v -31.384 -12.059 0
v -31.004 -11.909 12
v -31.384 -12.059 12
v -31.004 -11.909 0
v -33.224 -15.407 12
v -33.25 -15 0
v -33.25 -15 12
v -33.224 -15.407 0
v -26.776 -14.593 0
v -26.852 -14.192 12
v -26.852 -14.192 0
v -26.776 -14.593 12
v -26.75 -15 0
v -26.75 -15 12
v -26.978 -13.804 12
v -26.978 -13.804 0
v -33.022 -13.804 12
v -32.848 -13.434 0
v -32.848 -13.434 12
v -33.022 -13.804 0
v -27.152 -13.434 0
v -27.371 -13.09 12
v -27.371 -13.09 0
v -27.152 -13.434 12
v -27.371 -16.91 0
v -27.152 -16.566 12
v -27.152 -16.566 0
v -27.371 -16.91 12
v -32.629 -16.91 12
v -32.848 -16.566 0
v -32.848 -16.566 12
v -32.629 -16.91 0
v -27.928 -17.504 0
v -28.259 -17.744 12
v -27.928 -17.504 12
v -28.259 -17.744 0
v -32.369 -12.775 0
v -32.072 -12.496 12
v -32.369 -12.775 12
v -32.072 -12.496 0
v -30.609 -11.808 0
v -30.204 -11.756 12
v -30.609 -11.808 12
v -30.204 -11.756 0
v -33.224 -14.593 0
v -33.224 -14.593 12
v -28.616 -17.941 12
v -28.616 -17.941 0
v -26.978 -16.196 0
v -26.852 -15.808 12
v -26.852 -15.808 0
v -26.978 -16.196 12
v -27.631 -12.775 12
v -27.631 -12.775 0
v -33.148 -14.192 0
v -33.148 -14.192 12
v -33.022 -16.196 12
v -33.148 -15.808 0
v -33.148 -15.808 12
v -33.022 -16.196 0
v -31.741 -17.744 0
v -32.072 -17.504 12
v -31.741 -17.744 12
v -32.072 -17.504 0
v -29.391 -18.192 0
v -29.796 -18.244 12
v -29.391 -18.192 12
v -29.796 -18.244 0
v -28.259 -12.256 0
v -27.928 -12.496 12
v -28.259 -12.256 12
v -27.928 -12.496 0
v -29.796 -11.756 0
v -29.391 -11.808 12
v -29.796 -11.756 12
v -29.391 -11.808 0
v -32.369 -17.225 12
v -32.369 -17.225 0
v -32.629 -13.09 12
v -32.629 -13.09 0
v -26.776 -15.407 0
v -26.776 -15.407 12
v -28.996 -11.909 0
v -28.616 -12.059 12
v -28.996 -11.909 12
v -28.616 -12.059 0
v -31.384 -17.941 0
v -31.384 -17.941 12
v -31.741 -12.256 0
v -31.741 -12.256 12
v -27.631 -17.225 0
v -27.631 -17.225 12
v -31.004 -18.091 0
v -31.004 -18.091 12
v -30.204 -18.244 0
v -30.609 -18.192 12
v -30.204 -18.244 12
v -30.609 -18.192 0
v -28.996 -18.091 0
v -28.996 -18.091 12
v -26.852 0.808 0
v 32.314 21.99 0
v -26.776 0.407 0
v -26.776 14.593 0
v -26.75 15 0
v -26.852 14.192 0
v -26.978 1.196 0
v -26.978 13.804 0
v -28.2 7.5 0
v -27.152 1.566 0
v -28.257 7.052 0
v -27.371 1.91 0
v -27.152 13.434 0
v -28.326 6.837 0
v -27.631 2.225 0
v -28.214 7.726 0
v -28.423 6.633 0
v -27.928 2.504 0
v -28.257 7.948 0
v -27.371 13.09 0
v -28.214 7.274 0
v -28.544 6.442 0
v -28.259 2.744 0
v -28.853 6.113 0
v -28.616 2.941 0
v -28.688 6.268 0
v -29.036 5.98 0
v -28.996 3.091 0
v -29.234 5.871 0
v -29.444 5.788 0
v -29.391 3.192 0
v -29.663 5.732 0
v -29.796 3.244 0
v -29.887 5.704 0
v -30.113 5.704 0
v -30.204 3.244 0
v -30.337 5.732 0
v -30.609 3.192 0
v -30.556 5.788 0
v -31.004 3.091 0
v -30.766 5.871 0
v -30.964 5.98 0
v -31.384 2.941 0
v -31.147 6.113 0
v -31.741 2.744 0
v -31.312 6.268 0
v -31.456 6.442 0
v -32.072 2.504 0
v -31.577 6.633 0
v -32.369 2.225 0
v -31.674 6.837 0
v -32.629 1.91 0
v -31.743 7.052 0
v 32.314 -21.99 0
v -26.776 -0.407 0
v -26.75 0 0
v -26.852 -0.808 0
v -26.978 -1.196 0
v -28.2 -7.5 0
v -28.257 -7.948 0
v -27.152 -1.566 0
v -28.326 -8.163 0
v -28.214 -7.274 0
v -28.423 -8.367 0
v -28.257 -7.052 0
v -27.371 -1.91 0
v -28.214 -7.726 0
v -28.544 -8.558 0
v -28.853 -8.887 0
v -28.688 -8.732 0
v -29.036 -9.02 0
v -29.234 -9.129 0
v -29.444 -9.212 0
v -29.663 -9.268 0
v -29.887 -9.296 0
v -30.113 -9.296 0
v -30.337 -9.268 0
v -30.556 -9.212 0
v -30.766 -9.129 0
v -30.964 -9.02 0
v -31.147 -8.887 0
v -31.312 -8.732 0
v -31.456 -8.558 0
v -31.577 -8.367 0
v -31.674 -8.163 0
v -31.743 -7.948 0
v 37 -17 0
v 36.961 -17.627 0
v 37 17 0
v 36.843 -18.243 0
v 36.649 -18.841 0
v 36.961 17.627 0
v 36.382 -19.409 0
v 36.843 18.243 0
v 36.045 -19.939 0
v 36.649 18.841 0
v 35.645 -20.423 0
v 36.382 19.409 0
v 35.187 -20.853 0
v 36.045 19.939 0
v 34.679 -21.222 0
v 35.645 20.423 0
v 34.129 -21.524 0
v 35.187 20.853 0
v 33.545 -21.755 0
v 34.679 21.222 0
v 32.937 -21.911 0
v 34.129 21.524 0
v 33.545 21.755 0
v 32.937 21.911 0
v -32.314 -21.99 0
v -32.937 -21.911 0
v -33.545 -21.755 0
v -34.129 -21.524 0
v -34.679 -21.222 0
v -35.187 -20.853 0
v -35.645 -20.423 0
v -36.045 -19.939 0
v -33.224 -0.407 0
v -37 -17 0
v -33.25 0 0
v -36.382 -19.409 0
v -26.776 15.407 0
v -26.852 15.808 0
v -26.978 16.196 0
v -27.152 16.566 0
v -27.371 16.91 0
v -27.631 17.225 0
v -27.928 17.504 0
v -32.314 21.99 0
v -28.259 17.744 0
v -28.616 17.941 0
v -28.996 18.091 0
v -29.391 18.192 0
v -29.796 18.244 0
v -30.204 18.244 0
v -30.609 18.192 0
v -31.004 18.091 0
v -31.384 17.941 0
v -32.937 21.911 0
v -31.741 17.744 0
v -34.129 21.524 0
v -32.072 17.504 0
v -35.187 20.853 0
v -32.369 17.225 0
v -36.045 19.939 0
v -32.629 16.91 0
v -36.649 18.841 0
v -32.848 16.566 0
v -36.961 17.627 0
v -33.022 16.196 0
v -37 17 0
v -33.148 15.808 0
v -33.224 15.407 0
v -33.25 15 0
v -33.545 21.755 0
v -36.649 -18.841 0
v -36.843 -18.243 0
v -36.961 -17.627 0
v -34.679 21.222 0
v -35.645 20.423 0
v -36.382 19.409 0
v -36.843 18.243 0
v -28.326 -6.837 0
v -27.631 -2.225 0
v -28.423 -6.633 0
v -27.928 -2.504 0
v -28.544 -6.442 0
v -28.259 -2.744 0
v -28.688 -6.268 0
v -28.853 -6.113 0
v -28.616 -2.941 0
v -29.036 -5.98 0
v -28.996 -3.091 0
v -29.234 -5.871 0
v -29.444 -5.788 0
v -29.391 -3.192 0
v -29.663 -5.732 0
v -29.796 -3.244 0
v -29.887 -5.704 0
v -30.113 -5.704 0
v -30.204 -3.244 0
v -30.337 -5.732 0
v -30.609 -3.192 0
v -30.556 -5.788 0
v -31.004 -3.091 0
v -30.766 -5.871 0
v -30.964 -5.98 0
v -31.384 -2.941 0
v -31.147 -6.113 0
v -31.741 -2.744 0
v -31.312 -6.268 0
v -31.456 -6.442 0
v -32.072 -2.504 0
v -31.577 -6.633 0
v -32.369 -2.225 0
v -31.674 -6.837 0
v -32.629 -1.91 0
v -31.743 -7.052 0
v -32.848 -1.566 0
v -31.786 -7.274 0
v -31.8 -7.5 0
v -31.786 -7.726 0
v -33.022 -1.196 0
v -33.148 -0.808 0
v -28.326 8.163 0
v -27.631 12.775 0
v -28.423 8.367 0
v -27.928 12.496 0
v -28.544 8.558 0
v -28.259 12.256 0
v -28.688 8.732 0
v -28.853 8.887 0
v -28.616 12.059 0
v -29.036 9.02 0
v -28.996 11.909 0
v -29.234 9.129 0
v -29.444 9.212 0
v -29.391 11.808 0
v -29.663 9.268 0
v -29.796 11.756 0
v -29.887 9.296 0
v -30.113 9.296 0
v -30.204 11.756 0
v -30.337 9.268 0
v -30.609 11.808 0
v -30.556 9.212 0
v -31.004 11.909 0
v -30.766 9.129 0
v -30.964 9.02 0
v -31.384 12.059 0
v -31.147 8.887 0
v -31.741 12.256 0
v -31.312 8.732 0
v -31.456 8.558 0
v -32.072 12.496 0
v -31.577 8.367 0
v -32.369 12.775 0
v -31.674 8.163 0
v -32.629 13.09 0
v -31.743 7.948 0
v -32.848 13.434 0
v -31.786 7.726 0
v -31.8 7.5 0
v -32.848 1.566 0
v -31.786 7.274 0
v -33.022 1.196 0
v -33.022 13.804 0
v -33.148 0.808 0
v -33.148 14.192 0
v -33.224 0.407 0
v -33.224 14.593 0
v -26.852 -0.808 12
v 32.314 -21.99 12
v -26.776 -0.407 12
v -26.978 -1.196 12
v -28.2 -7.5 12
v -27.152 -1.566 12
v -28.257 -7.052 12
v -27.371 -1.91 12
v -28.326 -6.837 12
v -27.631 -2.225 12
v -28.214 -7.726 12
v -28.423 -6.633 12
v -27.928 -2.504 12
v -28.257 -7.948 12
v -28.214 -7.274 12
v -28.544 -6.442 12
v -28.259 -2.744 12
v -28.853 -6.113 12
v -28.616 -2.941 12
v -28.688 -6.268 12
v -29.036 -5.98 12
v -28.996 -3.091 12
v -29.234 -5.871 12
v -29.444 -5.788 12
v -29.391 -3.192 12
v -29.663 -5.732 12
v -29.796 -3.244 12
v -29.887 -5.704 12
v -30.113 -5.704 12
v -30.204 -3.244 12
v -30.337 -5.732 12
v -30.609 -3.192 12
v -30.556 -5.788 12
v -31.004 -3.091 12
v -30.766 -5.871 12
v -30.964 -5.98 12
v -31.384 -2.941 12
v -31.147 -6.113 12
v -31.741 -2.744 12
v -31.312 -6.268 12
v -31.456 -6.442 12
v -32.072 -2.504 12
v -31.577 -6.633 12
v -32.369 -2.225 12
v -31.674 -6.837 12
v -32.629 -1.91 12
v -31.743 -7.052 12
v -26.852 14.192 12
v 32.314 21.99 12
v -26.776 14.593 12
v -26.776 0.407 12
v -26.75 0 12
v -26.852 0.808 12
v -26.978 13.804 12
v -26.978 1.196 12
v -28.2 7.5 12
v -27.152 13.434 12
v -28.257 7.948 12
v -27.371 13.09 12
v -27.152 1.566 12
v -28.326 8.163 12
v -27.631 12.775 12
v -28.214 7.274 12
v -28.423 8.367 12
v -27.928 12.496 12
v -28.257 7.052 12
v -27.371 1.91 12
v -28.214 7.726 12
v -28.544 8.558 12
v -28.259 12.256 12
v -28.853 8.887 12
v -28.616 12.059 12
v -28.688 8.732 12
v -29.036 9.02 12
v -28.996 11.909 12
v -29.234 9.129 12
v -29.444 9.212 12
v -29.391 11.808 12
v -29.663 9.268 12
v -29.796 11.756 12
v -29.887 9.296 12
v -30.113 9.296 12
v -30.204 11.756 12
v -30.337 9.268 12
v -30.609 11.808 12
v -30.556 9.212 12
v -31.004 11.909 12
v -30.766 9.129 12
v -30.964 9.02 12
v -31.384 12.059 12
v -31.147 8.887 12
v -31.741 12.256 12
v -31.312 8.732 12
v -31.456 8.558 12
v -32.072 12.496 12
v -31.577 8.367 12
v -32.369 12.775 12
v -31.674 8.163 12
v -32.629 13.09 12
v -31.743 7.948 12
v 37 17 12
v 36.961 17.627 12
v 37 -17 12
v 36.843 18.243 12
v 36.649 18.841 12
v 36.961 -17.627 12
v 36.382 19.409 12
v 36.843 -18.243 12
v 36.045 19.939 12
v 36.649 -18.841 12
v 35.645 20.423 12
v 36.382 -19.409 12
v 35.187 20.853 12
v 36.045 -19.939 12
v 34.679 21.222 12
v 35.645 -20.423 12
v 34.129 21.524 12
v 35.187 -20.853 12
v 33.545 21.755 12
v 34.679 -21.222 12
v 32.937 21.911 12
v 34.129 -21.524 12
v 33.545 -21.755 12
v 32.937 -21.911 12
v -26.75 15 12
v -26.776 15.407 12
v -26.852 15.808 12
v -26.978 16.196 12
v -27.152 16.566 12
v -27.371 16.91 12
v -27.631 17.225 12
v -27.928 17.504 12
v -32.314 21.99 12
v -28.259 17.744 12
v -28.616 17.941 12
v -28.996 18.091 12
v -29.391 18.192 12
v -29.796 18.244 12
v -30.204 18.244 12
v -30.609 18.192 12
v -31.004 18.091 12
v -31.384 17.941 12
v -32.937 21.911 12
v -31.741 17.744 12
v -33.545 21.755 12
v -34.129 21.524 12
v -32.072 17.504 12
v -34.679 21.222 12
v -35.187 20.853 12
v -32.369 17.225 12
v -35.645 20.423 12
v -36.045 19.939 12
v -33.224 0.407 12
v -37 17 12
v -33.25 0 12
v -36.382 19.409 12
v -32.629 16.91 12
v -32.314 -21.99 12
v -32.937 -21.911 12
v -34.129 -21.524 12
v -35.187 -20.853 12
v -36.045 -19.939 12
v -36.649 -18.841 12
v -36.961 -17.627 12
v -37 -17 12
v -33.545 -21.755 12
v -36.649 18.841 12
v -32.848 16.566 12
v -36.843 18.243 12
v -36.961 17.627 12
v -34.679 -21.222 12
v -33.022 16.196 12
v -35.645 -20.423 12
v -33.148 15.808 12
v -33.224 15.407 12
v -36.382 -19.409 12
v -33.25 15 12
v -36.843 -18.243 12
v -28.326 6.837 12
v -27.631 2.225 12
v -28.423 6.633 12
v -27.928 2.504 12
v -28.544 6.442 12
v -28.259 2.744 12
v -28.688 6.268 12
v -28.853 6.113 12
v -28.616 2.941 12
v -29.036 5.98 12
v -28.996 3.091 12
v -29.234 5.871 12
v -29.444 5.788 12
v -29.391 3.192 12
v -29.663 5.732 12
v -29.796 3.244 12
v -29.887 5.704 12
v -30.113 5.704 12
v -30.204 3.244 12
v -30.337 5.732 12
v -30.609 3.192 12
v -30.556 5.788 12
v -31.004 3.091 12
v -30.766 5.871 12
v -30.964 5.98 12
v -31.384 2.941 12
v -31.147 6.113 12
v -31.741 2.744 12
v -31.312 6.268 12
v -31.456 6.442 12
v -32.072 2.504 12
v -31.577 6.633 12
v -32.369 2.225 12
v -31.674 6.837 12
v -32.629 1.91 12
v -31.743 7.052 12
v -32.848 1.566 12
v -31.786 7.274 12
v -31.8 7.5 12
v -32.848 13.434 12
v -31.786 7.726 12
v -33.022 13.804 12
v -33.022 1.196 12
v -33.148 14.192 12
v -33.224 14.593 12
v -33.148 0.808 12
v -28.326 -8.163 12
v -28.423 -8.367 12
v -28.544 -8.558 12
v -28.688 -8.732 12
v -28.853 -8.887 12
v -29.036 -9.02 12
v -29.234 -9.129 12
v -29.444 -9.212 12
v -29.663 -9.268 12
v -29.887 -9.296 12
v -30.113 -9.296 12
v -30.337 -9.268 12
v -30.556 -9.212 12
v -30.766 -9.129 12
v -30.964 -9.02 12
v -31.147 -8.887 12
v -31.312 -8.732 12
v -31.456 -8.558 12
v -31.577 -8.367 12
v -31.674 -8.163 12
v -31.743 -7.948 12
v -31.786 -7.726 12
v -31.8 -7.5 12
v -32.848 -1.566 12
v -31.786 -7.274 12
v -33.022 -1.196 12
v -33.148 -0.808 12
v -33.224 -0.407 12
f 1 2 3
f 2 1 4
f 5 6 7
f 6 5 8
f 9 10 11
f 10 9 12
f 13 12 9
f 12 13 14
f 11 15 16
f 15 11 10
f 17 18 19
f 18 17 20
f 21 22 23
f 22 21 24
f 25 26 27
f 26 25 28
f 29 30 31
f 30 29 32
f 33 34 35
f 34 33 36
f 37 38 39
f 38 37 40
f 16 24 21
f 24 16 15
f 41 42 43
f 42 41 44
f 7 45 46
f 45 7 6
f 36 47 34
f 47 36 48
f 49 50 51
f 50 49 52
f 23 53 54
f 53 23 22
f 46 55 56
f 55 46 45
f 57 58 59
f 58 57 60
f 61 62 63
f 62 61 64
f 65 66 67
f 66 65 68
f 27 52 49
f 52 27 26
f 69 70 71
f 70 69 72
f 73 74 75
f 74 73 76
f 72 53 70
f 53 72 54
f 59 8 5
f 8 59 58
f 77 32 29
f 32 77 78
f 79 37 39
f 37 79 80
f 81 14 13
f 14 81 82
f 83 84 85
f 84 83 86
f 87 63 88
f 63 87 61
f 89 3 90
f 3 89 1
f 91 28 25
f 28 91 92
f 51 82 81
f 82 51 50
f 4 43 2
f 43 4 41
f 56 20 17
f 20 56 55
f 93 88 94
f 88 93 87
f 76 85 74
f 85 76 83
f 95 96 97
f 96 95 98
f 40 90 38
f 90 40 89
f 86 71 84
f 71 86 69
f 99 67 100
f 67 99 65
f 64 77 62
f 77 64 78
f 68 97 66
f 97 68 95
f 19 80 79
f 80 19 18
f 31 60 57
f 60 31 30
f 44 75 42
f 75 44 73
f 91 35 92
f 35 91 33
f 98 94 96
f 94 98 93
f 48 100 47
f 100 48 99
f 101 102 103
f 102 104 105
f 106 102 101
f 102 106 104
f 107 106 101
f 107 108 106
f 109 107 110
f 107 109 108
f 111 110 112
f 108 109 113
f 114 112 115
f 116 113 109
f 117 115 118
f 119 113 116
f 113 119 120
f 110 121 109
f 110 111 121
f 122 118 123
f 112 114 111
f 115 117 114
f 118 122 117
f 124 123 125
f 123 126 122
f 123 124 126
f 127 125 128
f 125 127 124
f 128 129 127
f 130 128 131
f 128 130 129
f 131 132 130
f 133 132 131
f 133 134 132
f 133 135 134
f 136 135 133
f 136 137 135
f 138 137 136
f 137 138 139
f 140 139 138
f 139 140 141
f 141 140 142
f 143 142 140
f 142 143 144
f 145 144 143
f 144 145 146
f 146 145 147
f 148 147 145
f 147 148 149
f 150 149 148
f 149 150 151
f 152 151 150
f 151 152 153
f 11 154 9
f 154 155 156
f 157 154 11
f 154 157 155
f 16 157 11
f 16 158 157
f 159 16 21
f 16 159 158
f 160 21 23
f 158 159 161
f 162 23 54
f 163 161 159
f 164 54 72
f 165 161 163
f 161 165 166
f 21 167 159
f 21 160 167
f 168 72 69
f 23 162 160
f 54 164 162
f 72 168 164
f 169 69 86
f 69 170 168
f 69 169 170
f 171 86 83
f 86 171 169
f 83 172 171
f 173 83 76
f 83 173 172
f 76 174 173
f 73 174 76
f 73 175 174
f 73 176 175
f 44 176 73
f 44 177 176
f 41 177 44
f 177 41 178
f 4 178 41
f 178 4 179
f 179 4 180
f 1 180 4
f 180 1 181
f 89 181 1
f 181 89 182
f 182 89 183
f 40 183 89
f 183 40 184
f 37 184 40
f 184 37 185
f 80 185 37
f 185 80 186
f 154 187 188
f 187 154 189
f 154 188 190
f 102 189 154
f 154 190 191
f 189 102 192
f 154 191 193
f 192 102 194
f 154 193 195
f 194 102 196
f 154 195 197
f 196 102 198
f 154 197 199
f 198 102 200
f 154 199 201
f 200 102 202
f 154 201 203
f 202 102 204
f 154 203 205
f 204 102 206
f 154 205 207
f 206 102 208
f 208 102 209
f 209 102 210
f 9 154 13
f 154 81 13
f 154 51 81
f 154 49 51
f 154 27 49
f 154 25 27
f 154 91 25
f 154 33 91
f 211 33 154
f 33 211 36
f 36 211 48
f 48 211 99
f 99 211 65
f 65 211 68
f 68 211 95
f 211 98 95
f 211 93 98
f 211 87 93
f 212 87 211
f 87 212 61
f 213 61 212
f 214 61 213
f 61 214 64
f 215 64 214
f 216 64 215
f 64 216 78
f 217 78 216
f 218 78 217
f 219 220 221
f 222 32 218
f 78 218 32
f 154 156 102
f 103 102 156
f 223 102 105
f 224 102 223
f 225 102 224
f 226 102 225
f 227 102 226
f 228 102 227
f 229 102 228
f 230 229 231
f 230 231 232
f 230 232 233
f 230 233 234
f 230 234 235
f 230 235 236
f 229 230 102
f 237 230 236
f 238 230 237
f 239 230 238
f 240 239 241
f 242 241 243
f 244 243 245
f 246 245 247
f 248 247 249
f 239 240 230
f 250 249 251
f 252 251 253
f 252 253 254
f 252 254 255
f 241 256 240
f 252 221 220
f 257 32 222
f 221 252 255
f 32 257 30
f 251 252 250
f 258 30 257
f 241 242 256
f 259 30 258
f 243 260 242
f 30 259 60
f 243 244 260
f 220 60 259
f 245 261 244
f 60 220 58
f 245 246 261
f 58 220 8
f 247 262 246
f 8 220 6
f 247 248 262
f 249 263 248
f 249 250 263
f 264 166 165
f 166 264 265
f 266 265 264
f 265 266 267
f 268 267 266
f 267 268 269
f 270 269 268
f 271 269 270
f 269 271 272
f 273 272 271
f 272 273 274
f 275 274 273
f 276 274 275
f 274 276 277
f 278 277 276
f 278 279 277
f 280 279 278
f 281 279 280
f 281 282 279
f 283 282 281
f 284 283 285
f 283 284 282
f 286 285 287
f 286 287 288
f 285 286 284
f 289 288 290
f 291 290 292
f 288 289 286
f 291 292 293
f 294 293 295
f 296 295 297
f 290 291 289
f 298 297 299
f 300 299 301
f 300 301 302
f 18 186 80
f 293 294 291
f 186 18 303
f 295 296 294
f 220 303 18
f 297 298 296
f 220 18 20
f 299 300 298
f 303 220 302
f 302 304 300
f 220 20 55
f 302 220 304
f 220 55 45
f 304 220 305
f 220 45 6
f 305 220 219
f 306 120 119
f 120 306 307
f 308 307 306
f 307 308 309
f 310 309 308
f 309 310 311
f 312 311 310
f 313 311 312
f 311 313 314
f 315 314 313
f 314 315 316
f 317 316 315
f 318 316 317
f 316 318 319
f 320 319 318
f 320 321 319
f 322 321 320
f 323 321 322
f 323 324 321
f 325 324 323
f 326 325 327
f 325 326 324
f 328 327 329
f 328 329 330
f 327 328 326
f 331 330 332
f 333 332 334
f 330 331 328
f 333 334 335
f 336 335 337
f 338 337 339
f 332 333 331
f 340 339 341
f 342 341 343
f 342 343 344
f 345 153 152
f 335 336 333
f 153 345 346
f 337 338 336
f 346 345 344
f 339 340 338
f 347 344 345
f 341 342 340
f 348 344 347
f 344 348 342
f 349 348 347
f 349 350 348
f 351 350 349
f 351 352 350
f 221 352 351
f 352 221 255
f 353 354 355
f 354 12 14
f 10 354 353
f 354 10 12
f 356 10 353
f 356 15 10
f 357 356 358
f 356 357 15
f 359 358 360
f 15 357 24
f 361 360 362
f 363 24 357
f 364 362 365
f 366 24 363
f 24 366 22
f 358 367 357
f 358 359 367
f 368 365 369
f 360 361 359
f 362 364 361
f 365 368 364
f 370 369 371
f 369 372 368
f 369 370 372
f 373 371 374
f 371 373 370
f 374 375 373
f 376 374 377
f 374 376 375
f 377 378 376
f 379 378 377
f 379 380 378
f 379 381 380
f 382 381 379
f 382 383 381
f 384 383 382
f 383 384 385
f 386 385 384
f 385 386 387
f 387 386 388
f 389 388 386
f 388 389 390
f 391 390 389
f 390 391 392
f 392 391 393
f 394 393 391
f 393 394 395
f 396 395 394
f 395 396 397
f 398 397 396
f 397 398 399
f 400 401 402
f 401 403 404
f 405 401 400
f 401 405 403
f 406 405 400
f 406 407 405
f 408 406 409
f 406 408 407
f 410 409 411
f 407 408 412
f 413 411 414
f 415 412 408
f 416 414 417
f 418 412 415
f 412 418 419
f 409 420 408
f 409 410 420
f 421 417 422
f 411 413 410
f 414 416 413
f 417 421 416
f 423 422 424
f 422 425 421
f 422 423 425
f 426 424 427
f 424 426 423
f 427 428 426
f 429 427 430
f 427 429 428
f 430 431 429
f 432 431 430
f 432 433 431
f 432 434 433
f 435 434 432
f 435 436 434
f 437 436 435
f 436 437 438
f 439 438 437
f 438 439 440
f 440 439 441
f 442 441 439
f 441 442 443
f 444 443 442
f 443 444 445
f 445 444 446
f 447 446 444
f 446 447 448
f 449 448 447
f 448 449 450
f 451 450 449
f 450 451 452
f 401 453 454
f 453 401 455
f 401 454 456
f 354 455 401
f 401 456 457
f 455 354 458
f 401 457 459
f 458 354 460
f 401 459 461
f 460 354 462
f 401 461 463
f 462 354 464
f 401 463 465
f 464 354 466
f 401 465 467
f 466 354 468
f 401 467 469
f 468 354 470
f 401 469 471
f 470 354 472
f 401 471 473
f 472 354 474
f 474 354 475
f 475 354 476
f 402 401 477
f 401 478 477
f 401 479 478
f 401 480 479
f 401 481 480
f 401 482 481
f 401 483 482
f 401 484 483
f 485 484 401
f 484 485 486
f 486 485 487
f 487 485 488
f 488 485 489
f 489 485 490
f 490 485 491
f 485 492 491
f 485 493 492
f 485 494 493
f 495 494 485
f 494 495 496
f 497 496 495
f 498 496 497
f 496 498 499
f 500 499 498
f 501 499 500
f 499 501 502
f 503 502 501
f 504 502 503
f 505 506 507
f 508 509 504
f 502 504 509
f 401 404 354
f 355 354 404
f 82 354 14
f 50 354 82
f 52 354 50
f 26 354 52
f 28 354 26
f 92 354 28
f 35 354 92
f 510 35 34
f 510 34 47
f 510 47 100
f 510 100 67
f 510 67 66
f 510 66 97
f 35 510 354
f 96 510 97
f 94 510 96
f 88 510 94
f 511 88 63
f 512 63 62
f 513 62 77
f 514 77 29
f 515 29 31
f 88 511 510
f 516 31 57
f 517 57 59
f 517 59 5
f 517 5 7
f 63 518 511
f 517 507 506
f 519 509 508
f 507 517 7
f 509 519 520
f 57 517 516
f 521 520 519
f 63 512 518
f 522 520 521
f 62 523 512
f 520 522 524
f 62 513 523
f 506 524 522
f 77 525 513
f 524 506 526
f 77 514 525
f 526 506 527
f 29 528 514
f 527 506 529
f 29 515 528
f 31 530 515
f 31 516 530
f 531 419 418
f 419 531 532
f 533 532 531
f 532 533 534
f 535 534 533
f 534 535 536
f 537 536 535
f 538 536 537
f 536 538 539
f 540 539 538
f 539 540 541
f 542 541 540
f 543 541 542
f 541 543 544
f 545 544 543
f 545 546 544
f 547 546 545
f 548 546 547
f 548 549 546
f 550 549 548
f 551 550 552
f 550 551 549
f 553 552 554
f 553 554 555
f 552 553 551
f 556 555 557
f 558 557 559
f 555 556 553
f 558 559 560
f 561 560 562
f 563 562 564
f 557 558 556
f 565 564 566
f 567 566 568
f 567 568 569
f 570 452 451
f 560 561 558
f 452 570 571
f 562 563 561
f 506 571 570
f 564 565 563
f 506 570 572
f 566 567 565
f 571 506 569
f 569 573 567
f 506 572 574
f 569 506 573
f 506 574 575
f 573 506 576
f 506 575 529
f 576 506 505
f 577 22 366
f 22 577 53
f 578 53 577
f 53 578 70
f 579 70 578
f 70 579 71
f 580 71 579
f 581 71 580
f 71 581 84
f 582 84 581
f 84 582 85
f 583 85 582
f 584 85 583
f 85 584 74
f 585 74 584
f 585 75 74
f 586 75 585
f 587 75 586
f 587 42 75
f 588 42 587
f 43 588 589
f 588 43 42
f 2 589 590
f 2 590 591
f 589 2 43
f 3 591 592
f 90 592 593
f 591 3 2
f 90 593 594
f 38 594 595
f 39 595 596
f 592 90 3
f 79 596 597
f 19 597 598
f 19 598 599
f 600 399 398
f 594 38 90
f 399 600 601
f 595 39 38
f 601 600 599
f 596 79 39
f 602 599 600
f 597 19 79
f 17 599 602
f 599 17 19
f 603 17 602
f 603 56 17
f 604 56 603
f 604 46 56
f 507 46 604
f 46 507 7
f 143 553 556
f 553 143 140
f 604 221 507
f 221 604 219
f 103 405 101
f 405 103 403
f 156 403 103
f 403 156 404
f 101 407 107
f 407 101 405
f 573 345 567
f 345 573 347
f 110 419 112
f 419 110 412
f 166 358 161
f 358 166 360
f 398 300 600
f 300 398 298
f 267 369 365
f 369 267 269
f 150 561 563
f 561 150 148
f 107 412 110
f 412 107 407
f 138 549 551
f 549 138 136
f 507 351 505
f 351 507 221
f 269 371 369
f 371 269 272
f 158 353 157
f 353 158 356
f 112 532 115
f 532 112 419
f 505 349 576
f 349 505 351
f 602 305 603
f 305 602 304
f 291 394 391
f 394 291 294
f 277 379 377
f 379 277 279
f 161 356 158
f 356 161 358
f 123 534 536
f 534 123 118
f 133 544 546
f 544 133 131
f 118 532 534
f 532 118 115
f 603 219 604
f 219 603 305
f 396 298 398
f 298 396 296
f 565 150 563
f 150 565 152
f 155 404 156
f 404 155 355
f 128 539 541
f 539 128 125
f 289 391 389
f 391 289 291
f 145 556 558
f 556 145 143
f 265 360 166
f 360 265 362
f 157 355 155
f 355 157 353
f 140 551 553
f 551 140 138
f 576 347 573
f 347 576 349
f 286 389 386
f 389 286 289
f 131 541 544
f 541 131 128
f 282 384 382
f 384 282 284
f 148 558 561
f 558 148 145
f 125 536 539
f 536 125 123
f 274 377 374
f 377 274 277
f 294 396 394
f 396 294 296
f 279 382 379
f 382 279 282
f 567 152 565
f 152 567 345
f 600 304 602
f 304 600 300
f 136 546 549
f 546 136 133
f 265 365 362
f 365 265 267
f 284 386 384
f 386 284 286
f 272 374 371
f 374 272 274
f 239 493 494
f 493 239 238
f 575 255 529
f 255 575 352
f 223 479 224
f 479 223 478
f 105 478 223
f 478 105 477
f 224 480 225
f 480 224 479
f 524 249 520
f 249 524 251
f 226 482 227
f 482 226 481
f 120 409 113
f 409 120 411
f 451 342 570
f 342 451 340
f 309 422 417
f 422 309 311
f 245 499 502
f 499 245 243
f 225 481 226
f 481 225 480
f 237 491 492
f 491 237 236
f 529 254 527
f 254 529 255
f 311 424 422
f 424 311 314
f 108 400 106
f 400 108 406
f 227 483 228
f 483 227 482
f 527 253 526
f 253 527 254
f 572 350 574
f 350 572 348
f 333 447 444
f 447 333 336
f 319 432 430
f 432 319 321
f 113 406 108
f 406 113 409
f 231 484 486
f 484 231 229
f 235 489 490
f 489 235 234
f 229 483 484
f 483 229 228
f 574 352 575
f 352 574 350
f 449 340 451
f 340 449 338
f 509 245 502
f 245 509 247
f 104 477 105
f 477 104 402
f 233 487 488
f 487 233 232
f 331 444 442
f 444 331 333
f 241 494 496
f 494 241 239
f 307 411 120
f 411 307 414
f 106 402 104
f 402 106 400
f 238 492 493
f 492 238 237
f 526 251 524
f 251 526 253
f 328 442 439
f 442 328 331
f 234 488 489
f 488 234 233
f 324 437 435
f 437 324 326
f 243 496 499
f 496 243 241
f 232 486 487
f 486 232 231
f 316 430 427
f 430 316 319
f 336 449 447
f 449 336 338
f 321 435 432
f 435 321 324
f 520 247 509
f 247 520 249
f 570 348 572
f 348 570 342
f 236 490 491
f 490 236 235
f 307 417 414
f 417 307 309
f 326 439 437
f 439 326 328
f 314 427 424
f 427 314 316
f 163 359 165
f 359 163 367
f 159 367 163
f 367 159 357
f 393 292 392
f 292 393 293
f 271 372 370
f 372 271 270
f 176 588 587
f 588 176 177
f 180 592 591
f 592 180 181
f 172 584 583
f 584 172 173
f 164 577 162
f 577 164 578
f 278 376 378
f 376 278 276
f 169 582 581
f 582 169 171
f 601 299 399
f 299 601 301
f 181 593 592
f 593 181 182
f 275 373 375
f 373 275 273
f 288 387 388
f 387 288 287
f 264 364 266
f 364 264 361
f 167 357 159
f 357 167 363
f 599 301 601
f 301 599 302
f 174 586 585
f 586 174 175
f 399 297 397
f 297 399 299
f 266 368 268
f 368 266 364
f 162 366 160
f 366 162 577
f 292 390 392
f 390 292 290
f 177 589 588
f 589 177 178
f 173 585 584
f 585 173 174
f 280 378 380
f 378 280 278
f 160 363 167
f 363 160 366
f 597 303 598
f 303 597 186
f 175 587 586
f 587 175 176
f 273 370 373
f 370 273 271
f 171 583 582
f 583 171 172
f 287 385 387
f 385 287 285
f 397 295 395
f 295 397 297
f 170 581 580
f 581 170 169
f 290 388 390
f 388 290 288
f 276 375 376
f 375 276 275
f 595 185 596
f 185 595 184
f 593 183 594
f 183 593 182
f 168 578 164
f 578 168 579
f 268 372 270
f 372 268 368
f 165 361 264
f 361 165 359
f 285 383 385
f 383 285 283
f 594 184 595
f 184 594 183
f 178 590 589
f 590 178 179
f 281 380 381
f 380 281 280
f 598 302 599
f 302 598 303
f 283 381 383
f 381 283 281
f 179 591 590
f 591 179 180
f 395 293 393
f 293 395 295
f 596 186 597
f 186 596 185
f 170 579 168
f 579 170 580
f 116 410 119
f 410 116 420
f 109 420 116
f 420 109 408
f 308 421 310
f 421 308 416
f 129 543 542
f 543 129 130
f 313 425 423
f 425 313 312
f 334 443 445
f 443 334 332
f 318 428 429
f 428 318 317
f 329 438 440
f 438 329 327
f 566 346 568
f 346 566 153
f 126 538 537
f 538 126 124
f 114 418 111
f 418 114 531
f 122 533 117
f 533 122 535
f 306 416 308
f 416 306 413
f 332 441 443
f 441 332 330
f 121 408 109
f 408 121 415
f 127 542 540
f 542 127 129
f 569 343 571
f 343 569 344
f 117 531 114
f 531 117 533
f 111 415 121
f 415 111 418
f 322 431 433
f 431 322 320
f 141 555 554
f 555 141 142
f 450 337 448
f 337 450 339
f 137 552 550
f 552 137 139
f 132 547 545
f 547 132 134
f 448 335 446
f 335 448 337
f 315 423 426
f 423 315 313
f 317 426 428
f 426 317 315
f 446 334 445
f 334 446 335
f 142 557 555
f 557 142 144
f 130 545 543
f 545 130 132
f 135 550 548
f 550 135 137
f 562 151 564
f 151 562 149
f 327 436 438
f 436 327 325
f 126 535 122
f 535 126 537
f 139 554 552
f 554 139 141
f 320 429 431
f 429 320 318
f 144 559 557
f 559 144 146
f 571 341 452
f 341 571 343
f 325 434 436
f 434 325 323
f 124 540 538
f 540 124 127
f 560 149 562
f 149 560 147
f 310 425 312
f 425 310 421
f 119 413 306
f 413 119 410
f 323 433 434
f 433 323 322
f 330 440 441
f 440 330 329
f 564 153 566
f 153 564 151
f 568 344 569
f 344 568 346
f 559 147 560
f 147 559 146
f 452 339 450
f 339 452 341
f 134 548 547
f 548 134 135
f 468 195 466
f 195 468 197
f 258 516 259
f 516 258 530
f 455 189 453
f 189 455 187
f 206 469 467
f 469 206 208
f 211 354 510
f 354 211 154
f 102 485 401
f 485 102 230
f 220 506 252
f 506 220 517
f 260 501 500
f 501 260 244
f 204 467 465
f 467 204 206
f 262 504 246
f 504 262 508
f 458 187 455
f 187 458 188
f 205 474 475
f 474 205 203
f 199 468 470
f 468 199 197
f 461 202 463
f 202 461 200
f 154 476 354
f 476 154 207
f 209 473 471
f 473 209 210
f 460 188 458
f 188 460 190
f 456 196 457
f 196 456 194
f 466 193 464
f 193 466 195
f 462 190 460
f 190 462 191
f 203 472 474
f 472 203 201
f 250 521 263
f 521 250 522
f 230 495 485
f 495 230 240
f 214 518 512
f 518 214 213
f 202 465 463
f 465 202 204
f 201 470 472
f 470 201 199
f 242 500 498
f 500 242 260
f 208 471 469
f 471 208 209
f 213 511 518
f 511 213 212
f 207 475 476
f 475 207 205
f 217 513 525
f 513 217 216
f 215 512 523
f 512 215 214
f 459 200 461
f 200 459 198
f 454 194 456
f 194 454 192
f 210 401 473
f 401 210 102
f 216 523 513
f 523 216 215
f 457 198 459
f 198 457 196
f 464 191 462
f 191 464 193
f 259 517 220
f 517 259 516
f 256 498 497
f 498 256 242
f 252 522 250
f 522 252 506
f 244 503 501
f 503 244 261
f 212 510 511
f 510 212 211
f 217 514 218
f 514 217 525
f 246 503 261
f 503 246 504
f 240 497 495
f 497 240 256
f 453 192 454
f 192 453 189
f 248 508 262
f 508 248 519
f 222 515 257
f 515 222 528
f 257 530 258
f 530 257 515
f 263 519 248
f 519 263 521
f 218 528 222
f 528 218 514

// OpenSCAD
$fn = 50;


difference() {
	union() {
		hull() {
			translate(v = [-32.0000000000, 17.0000000000, 0]) {
				cylinder(h = 12, r = 5);
			}
			translate(v = [32.0000000000, 17.0000000000, 0]) {
				cylinder(h = 12, r = 5);
			}
			translate(v = [-32.0000000000, -17.0000000000, 0]) {
				cylinder(h = 12, r = 5);
			}
			translate(v = [32.0000000000, -17.0000000000, 0]) {
				cylinder(h = 12, r = 5);
			}
		}
	}
	union() {
		translate(v = [-30.0000000000, -15.0000000000, 0]) {
			cylinder(h = 12, r = 3.2500000000);
		}
		translate(v = [-30.0000000000, 0.0000000000, 0]) {
			cylinder(h = 12, r = 3.2500000000);
		}
		translate(v = [-30.0000000000, 15.0000000000, 0]) {
			cylinder(h = 12, r = 3.2500000000);
		}
		translate(v = [-30.0000000000, -15.0000000000, 0]) {
			cylinder(h = 12, r = 1.8000000000);
		}
		translate(v = [-30.0000000000, -7.5000000000, 0]) {
			cylinder(h = 12, r = 1.8000000000);
		}
		translate(v = [-30.0000000000, 0.0000000000, 0]) {
			cylinder(h = 12, r = 1.8000000000);
		}
		translate(v = [-30.0000000000, 7.5000000000, 0]) {
			cylinder(h = 12, r = 1.8000000000);
		}
		translate(v = [-30.0000000000, 15.0000000000, 0]) {
			cylinder(h = 12, r = 1.8000000000);
		}
		translate(v = [-30.0000000000, -15.0000000000, 0]) {
			cylinder(h = 12, r = 1.8000000000);
		}
		translate(v = [-30.0000000000, -7.5000000000, 0]) {
			cylinder(h = 12, r = 1.8000000000);
		}
		translate(v = [-30.0000000000, 0.0000000000, 0]) {
			cylinder(h = 12, r = 1.8000000000);
		}
		translate(v = [-30.0000000000, 7.5000000000, 0]) {
			cylinder(h = 12, r = 1.8000000000);
		}
		translate(v = [-30.0000000000, 15.0000000000, 0]) {
			cylinder(h = 12, r = 1.8000000000);
		}
		translate(v = [-30.0000000000, -15.0000000000, 0]) {
			cylinder(h = 12, r = 1.8000000000);
		}
		translate(v = [-30.0000000000, -7.5000000000, 0]) {
			cylinder(h = 12, r = 1.8000000000);
		}
		translate(v = [-30.0000000000, 0.0000000000, 0]) {
			cylinder(h = 12, r = 1.8000000000);
		}
		translate(v = [-30.0000000000, 7.5000000000, 0]) {
			cylinder(h = 12, r = 1.8000000000);
		}
		translate(v = [-30.0000000000, 15.0000000000, 0]) {
			cylinder(h = 12, r = 1.8000000000);
		}
	}
}
